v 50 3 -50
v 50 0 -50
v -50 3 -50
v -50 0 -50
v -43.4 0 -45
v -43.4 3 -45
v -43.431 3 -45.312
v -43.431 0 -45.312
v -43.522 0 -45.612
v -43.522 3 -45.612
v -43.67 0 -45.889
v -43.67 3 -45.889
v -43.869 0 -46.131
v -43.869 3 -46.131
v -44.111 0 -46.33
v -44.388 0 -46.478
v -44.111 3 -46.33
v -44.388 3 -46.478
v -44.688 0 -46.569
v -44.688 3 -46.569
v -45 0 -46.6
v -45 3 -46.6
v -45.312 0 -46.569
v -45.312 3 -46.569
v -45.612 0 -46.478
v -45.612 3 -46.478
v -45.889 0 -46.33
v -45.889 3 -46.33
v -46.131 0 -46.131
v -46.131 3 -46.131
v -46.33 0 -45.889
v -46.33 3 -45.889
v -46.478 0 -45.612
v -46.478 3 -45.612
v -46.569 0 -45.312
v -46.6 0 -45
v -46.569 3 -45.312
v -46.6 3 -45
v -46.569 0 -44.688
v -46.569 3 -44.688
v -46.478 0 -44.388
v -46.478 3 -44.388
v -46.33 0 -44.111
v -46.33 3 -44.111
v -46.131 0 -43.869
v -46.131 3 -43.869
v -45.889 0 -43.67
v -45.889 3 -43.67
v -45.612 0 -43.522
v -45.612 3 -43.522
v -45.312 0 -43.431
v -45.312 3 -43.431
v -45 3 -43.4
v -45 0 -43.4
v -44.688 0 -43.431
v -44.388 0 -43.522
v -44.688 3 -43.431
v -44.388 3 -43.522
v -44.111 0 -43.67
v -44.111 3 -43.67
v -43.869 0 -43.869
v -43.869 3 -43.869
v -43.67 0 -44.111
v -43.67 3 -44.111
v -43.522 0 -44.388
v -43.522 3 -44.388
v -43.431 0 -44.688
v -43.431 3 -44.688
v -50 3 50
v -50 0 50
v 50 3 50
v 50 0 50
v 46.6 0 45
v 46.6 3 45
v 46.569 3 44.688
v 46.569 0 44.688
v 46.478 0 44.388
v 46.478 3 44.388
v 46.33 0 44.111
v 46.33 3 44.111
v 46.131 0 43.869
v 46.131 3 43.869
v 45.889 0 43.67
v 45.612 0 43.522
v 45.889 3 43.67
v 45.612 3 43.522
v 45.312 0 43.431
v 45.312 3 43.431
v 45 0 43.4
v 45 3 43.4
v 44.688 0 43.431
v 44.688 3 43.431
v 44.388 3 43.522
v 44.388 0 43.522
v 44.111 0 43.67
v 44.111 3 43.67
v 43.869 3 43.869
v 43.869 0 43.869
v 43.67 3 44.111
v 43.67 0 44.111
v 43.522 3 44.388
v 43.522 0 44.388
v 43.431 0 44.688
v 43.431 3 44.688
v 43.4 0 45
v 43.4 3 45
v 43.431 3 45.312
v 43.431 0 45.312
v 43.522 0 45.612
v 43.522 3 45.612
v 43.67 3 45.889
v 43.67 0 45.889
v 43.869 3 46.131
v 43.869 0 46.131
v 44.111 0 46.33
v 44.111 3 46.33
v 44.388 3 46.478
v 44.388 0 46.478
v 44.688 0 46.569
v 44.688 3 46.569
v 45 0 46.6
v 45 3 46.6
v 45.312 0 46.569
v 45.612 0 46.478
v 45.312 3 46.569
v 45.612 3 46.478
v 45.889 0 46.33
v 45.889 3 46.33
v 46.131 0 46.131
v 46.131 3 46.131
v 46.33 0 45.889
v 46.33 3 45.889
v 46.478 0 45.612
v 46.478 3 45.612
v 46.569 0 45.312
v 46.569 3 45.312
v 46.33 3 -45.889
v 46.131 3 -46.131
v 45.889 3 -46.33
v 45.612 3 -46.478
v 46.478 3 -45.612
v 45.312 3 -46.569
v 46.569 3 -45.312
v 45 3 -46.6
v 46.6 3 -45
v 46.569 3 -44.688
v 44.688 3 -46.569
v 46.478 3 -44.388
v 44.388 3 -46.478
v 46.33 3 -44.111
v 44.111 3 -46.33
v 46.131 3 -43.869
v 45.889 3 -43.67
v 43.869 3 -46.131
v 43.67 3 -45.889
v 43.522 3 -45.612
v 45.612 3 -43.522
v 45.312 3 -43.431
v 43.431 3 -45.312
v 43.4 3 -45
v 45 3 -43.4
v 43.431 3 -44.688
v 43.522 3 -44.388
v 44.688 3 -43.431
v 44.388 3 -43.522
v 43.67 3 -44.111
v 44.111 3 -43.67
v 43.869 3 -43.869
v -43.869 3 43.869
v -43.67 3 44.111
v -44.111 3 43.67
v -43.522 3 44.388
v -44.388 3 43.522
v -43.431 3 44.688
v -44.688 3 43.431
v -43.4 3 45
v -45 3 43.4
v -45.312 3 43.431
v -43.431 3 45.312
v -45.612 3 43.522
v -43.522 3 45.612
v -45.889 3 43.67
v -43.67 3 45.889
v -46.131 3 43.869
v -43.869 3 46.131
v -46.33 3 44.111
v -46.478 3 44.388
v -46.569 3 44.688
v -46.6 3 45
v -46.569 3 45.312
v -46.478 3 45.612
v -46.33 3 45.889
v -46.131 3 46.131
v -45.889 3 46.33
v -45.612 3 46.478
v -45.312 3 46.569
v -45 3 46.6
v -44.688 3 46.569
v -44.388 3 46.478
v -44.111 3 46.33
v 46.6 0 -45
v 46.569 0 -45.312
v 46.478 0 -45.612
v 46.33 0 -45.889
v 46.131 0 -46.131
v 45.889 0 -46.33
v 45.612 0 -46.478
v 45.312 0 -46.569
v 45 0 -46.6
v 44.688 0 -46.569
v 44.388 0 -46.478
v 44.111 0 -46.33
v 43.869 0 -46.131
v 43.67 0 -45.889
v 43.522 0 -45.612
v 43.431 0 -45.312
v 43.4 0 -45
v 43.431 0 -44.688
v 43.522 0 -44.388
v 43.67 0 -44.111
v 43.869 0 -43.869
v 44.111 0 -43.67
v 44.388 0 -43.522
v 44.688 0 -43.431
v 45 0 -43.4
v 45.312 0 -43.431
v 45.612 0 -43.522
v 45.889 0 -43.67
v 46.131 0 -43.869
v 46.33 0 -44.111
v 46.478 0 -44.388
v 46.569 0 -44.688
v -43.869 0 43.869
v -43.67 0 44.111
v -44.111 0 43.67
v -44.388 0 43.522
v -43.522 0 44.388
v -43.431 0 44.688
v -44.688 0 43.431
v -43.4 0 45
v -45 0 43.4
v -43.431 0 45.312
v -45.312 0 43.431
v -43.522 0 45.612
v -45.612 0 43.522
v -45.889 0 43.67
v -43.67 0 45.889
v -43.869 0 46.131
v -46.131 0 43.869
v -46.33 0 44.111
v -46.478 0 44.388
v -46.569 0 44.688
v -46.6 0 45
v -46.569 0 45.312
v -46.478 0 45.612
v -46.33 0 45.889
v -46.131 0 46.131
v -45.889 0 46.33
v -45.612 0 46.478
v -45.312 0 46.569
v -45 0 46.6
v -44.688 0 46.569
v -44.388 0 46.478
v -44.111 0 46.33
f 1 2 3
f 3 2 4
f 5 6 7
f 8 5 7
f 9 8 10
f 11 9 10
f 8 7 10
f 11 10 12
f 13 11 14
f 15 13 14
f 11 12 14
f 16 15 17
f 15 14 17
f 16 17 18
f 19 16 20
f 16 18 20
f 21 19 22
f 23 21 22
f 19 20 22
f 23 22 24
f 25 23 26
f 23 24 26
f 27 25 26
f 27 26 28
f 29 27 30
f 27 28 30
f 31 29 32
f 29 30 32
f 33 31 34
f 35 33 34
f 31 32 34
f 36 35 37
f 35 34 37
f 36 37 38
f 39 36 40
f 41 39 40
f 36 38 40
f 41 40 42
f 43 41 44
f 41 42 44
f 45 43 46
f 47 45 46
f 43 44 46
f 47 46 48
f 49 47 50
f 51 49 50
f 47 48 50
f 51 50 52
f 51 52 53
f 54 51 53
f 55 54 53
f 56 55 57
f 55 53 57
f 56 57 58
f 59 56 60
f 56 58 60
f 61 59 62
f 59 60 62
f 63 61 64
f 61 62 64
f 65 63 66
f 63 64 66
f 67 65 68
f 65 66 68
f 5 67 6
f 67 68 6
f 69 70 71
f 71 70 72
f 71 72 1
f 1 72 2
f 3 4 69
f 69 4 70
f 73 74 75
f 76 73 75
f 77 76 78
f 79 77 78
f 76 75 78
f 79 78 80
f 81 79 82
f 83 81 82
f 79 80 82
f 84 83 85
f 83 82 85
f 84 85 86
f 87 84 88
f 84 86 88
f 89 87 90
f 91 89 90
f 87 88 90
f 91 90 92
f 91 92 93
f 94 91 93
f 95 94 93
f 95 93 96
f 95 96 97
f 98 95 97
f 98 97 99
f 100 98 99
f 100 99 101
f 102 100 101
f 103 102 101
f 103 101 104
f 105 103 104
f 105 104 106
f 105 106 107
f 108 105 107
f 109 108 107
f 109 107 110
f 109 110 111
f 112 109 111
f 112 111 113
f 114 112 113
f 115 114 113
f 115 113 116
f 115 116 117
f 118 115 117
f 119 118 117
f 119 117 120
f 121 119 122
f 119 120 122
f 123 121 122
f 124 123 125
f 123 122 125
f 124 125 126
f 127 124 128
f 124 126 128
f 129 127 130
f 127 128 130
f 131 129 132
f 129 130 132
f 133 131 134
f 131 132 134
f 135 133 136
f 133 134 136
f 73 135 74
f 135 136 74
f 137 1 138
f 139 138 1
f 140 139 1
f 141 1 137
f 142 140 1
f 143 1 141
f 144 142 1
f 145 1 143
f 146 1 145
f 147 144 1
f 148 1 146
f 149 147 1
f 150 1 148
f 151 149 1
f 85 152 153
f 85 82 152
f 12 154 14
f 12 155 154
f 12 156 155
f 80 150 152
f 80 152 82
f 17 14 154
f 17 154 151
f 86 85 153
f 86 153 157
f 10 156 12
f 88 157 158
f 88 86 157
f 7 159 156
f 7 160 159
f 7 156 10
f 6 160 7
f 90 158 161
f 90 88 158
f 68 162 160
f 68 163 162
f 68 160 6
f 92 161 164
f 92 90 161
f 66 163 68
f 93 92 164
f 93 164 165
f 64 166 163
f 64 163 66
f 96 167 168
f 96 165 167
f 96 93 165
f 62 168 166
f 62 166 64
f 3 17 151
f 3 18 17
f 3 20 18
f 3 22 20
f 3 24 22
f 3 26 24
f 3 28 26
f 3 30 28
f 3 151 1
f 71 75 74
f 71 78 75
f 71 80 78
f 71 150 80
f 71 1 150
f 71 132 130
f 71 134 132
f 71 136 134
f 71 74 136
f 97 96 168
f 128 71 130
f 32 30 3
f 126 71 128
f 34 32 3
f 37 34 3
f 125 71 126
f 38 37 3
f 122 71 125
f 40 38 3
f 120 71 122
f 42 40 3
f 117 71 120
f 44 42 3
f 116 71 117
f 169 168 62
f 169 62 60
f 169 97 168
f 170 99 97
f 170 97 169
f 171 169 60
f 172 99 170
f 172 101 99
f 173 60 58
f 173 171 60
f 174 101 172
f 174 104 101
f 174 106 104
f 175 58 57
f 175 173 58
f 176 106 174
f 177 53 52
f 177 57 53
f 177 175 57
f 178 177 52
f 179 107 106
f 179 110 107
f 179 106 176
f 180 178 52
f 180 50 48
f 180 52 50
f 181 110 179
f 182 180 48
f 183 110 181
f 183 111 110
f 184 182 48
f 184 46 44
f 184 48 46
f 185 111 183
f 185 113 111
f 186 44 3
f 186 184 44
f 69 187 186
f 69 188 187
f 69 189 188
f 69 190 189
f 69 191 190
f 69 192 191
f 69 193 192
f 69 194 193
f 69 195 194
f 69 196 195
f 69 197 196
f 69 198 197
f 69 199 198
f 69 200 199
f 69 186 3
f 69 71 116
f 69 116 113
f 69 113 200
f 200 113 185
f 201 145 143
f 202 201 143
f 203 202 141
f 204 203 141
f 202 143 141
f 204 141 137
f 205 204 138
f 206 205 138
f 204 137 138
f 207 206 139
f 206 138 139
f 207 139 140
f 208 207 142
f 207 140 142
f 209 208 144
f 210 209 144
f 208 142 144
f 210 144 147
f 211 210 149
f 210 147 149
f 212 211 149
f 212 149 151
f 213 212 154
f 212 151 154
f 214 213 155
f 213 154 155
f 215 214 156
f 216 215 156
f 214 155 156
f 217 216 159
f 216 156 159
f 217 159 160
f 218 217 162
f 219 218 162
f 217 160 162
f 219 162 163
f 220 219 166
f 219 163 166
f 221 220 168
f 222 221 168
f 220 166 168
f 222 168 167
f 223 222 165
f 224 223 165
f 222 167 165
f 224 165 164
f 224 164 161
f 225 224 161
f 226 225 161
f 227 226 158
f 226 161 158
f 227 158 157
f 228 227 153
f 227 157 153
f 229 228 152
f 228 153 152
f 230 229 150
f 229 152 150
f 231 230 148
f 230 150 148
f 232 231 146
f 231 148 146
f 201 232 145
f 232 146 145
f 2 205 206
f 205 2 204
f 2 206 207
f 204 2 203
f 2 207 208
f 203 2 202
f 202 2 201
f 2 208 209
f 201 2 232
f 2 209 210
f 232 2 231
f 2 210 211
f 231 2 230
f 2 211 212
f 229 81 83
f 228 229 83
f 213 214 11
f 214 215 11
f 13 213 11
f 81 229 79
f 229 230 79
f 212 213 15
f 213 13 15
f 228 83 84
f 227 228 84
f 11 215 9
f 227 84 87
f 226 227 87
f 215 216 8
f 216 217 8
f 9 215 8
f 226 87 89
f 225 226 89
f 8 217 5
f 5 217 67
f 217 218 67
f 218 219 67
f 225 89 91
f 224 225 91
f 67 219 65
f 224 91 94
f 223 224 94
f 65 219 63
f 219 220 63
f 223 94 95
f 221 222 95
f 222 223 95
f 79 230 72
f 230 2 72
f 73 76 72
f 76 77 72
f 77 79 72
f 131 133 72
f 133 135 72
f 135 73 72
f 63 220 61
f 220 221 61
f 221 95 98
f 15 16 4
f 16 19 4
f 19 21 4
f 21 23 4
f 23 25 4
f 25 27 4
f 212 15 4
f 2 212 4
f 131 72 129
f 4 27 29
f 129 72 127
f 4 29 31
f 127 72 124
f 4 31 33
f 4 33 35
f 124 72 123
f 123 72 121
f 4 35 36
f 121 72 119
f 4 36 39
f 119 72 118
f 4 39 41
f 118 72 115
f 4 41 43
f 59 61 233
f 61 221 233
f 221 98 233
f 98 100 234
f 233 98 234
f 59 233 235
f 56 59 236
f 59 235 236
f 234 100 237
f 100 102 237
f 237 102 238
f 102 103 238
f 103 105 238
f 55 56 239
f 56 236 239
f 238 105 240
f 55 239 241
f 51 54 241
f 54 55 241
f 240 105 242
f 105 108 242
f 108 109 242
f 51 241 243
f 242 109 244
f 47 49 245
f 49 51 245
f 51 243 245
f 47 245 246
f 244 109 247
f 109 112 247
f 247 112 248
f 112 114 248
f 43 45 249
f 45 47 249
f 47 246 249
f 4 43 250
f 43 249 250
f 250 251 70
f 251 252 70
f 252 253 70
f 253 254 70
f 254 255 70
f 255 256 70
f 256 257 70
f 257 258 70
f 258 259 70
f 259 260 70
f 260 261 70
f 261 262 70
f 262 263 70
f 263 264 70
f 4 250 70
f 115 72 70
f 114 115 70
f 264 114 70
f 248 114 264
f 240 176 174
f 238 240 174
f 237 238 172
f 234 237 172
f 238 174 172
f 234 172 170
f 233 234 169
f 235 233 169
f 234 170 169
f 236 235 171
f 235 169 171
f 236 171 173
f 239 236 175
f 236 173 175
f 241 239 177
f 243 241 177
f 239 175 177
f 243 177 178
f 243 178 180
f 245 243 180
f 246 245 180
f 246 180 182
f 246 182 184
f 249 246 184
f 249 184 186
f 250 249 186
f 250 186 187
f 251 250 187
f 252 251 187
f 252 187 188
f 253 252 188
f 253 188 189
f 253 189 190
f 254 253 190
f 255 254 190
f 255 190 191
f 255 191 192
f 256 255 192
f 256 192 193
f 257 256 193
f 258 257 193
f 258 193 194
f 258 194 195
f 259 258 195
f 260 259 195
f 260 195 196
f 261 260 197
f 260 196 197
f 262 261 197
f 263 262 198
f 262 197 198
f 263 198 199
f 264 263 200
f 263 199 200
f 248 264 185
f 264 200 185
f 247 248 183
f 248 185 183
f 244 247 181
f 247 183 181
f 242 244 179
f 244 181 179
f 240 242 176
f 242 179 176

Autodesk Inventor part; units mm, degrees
ref_plane "YZ Plane" through (0, 0, 0) normal (1, 0, 0) x (0, 1, 0)
ref_plane "XZ Plane" through (0, 0, 0) normal (0, 1, 0) x (-1, 0, 0)
ref_plane "XY Plane" through (0, 0, 0) normal (0, 0, 1) x (1, 0, 0)
sketch "Sketch1" plane through (0, 0, 0) normal (0, 1, 0) x (-1, 0, 0)
  line L0 (50, 50) -> (-50, 50)
  line L1 (-50, 50) -> (-50, -50)
  line L2 (-50, -50) -> (50, -50)
  line L3 (50, -50) -> (50, 50)
  line L4 (50, 50) -> (-50, -50) construction
  line L5 (-50, 50) -> (50, -50) construction
  point P0 (0, 0)
  dimension "d0" = 100
  dimension "d1" = 100
extrude "Extrusion1" add sketch "Sketch1" along normal blind 3
sketch "Sketch2" plane through (0, 3, 0) normal (0, 1, 0) x (1, 0, 0)
  circle A0 centre (-45, 45) radius 1.6
  line L0 (-50, 50) -> (-50, -50) projected
  line L1 (50, 50) -> (-50, 50) projected
  circle A1 centre (45, 45) radius 1.6
  circle A2 centre (45, -45) radius 1.6
  circle A3 centre (-45, -45) radius 1.6
  line L2 (50, -50) -> (50, 50) projected
  line L3 (-50, -50) -> (50, -50) projected
  point P0 (0, 0)
  dimension "d4" = 3.2
  dimension "d5" = 5
  dimension "d6" = 5
  dimension "d7" = 3.2
  dimension "d8" = 3.2
  dimension "d9" = 3.2
  dimension "d10" = 5
  dimension "d11" = 5
  dimension "d12" = 5
  dimension "d13" = 5
  dimension "d14" = 5
  dimension "d15" = 5
extrude "Extrusion2" cut sketch "Sketch2" against normal through all contours A0 | A1 | A2 | A3
properties part number "PCBV1" material "ABS Plastic"
